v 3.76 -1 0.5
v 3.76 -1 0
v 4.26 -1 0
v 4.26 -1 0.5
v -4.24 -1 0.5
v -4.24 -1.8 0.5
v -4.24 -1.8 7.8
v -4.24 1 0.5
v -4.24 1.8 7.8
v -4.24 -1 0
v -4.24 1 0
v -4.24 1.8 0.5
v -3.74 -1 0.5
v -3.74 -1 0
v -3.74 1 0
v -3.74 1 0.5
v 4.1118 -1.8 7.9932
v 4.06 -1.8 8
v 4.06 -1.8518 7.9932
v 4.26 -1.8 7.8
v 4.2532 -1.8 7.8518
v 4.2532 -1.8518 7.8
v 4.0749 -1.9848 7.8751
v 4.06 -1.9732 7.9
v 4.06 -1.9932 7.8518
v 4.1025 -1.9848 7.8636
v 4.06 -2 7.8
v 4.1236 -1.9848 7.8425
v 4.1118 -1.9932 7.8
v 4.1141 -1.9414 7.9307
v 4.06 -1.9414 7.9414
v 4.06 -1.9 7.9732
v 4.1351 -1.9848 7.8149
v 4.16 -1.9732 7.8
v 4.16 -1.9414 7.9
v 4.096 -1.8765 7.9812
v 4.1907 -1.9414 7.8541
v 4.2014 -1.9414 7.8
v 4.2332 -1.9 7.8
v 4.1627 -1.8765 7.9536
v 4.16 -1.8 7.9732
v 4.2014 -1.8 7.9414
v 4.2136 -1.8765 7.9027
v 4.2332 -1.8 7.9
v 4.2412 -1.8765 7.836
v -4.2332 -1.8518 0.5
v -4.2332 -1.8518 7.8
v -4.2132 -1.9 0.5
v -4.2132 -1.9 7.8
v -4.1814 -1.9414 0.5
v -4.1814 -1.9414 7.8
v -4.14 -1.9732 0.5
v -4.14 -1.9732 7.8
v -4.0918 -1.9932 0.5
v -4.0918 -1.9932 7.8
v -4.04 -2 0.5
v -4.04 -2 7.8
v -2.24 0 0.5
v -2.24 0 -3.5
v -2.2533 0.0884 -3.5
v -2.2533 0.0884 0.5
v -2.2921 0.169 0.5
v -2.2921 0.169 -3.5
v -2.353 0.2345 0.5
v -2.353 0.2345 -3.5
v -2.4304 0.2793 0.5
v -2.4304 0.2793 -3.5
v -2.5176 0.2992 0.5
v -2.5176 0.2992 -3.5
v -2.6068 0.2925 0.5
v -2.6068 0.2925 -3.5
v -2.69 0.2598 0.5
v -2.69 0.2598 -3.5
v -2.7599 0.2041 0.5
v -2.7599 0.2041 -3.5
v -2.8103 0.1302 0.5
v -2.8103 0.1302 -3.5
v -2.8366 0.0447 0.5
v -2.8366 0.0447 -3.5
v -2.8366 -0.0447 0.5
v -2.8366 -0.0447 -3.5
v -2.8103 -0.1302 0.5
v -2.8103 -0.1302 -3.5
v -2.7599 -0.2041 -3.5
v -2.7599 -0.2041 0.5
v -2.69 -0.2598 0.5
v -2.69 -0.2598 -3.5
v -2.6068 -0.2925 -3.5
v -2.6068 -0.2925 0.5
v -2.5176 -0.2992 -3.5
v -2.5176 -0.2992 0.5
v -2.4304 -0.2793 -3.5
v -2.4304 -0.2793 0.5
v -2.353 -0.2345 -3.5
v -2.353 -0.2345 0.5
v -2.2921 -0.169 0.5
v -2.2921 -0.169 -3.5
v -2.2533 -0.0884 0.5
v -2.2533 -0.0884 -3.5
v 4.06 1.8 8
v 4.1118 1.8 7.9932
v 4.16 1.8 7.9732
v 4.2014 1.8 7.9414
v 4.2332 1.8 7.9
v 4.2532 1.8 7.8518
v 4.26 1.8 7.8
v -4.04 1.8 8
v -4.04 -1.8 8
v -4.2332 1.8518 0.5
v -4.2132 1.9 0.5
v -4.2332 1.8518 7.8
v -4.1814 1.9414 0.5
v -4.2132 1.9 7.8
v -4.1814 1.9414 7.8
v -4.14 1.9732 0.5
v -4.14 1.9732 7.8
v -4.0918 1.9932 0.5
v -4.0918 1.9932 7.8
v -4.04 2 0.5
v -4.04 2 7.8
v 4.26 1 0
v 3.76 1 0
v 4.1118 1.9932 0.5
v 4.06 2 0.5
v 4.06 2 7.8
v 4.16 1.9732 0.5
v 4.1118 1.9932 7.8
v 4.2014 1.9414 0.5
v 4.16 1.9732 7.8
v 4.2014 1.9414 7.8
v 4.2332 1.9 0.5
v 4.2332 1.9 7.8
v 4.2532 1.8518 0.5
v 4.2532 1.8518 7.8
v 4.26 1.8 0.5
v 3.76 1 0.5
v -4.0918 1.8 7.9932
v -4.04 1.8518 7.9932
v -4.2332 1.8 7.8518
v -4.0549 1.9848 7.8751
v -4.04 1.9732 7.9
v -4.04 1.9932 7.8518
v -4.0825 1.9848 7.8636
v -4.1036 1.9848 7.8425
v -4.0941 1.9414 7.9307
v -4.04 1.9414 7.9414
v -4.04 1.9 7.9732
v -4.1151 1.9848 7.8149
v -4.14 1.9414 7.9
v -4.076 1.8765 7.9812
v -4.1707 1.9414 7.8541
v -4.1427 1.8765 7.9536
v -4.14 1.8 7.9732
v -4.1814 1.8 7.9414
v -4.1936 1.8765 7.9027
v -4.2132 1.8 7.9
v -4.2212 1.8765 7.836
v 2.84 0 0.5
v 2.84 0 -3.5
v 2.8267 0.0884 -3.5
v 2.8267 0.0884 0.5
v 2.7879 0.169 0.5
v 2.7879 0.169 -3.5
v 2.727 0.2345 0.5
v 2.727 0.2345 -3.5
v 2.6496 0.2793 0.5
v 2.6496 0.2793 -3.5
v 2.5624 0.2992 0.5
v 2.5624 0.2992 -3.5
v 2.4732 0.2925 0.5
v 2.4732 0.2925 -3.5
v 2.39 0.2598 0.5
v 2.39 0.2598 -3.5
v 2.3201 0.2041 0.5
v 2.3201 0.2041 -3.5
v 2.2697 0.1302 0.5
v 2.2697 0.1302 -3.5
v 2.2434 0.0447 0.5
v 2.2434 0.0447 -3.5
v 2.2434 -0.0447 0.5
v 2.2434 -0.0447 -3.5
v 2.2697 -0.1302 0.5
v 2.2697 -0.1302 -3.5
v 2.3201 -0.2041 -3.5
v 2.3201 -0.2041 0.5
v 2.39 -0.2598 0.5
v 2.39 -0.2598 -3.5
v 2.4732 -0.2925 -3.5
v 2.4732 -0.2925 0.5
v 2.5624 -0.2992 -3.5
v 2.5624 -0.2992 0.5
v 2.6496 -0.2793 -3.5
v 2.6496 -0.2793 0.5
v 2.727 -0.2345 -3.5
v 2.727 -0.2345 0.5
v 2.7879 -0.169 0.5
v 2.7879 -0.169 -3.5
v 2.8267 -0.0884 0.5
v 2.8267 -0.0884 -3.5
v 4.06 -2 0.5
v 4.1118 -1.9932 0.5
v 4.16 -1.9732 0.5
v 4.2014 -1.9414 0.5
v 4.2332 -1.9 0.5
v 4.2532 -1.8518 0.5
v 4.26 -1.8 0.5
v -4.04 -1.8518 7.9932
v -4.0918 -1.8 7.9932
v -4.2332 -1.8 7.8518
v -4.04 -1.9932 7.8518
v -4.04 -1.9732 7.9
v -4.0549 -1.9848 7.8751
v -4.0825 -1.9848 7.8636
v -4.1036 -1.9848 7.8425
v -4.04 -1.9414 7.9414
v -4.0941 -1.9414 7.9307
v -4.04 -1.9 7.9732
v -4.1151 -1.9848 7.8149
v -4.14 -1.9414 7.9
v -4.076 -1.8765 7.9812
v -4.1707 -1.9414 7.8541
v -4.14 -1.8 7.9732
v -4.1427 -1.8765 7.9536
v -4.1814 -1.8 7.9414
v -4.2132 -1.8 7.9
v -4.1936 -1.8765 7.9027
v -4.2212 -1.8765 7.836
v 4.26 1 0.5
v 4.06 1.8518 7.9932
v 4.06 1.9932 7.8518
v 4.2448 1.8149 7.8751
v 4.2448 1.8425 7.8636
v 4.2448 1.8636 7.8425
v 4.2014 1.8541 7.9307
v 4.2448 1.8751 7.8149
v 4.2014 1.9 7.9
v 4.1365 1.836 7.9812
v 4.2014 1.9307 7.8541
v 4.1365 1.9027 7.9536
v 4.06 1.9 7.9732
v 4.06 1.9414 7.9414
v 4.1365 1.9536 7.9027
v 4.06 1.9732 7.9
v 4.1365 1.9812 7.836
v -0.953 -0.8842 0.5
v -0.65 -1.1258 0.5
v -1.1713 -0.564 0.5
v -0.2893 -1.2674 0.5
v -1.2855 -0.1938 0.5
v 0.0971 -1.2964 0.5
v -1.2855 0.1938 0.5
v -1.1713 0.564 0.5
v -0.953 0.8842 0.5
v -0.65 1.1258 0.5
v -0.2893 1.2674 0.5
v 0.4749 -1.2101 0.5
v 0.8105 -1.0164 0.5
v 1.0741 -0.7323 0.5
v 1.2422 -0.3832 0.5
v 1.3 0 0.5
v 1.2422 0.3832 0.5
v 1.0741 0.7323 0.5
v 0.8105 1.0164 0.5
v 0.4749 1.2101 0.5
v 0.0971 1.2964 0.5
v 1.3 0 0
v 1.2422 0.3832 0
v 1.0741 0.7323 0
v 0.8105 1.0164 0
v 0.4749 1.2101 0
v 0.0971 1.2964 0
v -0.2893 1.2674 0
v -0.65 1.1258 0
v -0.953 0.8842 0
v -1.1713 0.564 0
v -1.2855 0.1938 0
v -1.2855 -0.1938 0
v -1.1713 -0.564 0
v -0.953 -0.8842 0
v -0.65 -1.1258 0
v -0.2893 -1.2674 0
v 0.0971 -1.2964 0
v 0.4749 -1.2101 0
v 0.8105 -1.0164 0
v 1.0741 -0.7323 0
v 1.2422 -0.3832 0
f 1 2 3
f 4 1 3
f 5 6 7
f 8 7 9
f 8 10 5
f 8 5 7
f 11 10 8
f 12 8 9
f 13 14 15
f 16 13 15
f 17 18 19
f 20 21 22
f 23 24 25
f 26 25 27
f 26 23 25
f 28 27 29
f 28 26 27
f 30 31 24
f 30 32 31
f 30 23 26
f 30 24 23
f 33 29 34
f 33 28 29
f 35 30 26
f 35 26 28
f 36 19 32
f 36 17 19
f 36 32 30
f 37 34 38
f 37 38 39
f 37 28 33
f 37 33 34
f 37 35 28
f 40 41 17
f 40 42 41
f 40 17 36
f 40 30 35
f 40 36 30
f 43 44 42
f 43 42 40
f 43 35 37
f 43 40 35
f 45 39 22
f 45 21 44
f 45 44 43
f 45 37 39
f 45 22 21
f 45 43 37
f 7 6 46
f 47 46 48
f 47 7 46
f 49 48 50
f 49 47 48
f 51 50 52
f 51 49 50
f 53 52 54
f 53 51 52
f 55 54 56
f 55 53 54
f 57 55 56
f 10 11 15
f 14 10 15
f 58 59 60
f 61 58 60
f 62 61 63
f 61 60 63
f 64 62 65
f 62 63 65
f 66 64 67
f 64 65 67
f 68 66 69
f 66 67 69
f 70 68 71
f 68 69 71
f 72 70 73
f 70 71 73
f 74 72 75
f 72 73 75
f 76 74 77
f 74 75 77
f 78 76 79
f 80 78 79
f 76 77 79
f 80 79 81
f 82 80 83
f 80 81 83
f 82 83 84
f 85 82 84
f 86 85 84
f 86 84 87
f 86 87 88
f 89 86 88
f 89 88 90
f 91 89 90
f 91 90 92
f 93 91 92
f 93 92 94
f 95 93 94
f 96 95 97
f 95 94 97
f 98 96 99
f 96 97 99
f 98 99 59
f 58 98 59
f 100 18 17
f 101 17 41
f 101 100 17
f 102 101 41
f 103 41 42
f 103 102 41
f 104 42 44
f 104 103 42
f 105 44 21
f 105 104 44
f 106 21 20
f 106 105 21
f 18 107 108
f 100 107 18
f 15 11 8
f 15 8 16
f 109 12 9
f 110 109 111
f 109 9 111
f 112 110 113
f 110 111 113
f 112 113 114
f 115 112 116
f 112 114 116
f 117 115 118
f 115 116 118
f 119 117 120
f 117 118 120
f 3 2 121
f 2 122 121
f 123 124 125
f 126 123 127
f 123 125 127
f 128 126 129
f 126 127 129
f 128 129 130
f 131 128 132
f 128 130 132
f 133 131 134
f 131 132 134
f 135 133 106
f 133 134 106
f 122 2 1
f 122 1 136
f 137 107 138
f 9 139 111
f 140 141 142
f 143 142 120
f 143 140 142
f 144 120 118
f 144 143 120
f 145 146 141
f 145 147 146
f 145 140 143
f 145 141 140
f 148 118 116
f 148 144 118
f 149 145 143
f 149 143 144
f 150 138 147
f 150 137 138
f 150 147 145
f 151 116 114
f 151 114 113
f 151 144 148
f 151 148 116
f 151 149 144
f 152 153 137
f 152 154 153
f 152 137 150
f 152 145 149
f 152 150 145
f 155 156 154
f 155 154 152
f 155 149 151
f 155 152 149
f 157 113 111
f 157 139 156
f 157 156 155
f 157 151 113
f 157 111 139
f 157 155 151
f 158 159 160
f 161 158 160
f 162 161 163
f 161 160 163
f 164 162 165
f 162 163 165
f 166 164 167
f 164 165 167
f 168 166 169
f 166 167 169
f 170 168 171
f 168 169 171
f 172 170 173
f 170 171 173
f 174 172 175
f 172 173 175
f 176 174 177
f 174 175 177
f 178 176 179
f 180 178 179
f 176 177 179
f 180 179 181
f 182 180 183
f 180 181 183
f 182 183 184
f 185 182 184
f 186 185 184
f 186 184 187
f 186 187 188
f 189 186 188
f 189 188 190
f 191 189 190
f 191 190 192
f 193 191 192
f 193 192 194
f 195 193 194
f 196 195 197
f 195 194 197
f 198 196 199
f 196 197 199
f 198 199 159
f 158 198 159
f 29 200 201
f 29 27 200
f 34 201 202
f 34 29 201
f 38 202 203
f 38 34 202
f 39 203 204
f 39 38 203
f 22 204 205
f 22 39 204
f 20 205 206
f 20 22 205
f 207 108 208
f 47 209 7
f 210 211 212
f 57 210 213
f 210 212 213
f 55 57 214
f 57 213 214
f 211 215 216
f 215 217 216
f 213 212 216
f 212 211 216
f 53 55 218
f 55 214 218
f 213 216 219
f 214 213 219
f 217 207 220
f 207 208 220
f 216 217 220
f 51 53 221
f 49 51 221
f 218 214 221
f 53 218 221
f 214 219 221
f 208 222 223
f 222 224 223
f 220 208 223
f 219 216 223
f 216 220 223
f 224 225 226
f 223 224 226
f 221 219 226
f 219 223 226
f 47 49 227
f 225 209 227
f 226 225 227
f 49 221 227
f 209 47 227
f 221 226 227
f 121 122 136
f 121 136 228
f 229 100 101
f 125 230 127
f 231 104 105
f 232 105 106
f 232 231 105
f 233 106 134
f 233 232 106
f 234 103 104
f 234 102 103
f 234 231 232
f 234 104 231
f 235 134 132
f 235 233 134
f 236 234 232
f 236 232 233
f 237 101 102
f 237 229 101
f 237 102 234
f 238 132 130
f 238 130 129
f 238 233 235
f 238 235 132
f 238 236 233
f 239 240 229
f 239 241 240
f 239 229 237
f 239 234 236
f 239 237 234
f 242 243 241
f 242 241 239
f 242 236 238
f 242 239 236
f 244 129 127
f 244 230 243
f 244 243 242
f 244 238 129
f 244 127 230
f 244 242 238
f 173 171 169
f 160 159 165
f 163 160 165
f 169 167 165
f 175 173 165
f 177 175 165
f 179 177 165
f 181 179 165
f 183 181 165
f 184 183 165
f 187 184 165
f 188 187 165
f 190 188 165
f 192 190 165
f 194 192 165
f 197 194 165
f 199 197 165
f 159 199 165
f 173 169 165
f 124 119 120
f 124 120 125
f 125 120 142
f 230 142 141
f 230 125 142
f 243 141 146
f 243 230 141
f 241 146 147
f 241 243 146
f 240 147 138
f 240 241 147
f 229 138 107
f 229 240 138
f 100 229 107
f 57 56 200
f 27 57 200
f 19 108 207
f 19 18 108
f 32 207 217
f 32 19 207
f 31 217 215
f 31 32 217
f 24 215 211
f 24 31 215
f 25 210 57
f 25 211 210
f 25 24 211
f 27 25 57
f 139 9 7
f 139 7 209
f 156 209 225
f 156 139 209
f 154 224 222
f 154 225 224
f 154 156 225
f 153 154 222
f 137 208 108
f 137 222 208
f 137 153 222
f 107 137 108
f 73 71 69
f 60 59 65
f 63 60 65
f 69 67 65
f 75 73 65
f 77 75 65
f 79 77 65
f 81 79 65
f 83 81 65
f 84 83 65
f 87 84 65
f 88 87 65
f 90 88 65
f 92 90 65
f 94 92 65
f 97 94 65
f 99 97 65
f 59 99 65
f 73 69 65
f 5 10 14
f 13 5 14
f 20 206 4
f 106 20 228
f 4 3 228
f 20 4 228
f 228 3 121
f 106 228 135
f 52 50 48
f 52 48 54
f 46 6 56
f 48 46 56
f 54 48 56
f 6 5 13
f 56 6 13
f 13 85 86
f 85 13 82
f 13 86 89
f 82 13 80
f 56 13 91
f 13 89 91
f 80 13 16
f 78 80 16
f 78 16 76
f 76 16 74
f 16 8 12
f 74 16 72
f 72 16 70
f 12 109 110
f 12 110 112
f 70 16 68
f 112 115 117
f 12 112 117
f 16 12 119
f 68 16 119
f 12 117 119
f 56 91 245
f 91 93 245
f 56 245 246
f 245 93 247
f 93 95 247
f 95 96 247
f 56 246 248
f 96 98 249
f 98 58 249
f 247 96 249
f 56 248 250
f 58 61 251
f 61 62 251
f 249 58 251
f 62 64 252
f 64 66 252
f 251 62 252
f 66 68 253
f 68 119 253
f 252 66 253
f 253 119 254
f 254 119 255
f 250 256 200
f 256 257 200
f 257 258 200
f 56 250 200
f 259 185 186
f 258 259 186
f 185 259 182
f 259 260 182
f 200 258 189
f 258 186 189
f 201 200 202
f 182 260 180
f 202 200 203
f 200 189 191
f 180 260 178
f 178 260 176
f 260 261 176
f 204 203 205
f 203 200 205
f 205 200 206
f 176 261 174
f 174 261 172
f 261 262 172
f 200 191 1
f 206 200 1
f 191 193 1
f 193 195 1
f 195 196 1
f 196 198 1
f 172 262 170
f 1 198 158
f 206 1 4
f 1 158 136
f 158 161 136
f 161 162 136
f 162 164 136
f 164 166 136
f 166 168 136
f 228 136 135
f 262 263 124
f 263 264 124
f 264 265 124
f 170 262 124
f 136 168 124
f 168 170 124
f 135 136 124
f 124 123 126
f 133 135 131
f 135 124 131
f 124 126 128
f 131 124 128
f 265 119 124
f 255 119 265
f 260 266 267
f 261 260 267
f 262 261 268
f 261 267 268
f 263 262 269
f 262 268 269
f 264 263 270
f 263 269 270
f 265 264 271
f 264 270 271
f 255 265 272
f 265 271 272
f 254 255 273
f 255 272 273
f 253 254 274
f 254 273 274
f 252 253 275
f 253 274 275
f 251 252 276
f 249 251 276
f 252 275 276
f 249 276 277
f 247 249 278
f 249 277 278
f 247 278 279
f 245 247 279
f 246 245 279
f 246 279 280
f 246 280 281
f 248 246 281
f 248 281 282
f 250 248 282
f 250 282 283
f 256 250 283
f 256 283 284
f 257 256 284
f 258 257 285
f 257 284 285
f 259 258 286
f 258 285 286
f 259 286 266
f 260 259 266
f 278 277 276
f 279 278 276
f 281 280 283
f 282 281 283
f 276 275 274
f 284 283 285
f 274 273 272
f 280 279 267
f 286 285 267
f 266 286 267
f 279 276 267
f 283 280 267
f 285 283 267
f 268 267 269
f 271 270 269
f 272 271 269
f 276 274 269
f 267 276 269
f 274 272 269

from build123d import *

# Parameters (mm, degrees)
CYLINDER_R           = 1.3
CYLINDER_DEPTH       = 0.5
CYLINDER001_R        = 0.3
CYLINDER001_DEPTH    = 4
CYLINDER001001_R     = 0.3
CYLINDER001001_DEPTH = 4
BOX001001001_W       = 10.5
BOX001001001_H       = 3
BOX001001001_DEPTH   = 0.5
BOX001_W             = 7.5
BOX001_H             = 6
BOX001_DEPTH         = 0.5
BOX001001_W          = 10.5
BOX001001_H          = 3
BOX001001_DEPTH      = 0.5
BOX_W                = 8.5
BOX_H                = 4
BOX_DEPTH            = 8
FILLET_R             = 0.2


with BuildPart() as cylinder:
    # Cylinder → Cylinder (new body)
    with BuildSketch(Plane.XY):
        Circle(CYLINDER_R)
    extrude(amount=CYLINDER_DEPTH)


with BuildPart() as pin:
    # Cylinder001 → Cylinder001 (new body)
    with BuildSketch(Plane(origin=(-2.54, 0, -3.5), x_dir=(1, 0, 0), z_dir=(0, 0, 1))):
        Circle(CYLINDER001_R)
    extrude(amount=CYLINDER001_DEPTH)


with BuildPart() as pin001:
    # Cylinder001001 → Cylinder001001 (new body)
    with BuildSketch(Plane(origin=(2.54, 0, -3.5), x_dir=(1, 0, 0), z_dir=(0, 0, 1))):
        Circle(CYLINDER001001_R)
    extrude(amount=CYLINDER001001_DEPTH)


with BuildPart() as box001001001:
    # Box001001001 → Box001001001 (new body)
    with BuildSketch(Plane(origin=(-5.74, 1, 0), x_dir=(1, 0, 0), z_dir=(0, 0, 1))):
        with Locations((5.25, 1.5)):
            Rectangle(BOX001001001_W, BOX001001001_H)
    extrude(amount=BOX001001001_DEPTH)


with BuildPart() as box001:
    # Box001 → Box001 (new body)
    with BuildSketch(Plane(origin=(-3.74, -3, 0), x_dir=(1, 0, 0), z_dir=(0, 0, 1))):
        with Locations((3.75, 3)):
            Rectangle(BOX001_W, BOX001_H)
    extrude(amount=BOX001_DEPTH)


with BuildPart() as fusion:
    # Box001001 → Box001001 (new body)
    with BuildSketch(Plane(origin=(-5.74, -4, 0), x_dir=(1, 0, 0), z_dir=(0, 0, 1))):
        with Locations((5.25, 1.5)):
            Rectangle(BOX001001_W, BOX001001_H)
    extrude(amount=BOX001001_DEPTH)

    # Fusion: union Box001001001, Box001
    add(box001001001.part)
    add(box001.part)


with BuildPart() as fuse_te5:
    # Box → Box (new body)
    with BuildSketch(Plane(origin=(-4.24, -2, 0), x_dir=(1, 0, 0), z_dir=(0, 0, 1))):
        with Locations((4.25, 2)):
            Rectangle(BOX_W, BOX_H)
    extrude(amount=BOX_DEPTH)

    # Cut: cut Fusion
    add(fusion.part, mode=Mode.SUBTRACT)

    # Fillet
    fillet_edges = [fuse_te5.edges().sort_by_distance(p)[0] for p in [
        (-4.24, 0, 8),
        (0.01, 2, 8),
        (4.26, 0, 8),
        (0.01, -2, 8),
        (-4.24, -2, 4.25),
        (-4.24, 2, 4.25),
        (4.26, 2, 4.25),
        (4.26, -2, 4.25),
    ]]
    fillet(fillet_edges, radius=FILLET_R)

    # Fusion001: union Cylinder, PIN, PIN001
    add(cylinder.part)
    add(pin.part)
    add(pin001.part)


solid = fuse_te5.part
